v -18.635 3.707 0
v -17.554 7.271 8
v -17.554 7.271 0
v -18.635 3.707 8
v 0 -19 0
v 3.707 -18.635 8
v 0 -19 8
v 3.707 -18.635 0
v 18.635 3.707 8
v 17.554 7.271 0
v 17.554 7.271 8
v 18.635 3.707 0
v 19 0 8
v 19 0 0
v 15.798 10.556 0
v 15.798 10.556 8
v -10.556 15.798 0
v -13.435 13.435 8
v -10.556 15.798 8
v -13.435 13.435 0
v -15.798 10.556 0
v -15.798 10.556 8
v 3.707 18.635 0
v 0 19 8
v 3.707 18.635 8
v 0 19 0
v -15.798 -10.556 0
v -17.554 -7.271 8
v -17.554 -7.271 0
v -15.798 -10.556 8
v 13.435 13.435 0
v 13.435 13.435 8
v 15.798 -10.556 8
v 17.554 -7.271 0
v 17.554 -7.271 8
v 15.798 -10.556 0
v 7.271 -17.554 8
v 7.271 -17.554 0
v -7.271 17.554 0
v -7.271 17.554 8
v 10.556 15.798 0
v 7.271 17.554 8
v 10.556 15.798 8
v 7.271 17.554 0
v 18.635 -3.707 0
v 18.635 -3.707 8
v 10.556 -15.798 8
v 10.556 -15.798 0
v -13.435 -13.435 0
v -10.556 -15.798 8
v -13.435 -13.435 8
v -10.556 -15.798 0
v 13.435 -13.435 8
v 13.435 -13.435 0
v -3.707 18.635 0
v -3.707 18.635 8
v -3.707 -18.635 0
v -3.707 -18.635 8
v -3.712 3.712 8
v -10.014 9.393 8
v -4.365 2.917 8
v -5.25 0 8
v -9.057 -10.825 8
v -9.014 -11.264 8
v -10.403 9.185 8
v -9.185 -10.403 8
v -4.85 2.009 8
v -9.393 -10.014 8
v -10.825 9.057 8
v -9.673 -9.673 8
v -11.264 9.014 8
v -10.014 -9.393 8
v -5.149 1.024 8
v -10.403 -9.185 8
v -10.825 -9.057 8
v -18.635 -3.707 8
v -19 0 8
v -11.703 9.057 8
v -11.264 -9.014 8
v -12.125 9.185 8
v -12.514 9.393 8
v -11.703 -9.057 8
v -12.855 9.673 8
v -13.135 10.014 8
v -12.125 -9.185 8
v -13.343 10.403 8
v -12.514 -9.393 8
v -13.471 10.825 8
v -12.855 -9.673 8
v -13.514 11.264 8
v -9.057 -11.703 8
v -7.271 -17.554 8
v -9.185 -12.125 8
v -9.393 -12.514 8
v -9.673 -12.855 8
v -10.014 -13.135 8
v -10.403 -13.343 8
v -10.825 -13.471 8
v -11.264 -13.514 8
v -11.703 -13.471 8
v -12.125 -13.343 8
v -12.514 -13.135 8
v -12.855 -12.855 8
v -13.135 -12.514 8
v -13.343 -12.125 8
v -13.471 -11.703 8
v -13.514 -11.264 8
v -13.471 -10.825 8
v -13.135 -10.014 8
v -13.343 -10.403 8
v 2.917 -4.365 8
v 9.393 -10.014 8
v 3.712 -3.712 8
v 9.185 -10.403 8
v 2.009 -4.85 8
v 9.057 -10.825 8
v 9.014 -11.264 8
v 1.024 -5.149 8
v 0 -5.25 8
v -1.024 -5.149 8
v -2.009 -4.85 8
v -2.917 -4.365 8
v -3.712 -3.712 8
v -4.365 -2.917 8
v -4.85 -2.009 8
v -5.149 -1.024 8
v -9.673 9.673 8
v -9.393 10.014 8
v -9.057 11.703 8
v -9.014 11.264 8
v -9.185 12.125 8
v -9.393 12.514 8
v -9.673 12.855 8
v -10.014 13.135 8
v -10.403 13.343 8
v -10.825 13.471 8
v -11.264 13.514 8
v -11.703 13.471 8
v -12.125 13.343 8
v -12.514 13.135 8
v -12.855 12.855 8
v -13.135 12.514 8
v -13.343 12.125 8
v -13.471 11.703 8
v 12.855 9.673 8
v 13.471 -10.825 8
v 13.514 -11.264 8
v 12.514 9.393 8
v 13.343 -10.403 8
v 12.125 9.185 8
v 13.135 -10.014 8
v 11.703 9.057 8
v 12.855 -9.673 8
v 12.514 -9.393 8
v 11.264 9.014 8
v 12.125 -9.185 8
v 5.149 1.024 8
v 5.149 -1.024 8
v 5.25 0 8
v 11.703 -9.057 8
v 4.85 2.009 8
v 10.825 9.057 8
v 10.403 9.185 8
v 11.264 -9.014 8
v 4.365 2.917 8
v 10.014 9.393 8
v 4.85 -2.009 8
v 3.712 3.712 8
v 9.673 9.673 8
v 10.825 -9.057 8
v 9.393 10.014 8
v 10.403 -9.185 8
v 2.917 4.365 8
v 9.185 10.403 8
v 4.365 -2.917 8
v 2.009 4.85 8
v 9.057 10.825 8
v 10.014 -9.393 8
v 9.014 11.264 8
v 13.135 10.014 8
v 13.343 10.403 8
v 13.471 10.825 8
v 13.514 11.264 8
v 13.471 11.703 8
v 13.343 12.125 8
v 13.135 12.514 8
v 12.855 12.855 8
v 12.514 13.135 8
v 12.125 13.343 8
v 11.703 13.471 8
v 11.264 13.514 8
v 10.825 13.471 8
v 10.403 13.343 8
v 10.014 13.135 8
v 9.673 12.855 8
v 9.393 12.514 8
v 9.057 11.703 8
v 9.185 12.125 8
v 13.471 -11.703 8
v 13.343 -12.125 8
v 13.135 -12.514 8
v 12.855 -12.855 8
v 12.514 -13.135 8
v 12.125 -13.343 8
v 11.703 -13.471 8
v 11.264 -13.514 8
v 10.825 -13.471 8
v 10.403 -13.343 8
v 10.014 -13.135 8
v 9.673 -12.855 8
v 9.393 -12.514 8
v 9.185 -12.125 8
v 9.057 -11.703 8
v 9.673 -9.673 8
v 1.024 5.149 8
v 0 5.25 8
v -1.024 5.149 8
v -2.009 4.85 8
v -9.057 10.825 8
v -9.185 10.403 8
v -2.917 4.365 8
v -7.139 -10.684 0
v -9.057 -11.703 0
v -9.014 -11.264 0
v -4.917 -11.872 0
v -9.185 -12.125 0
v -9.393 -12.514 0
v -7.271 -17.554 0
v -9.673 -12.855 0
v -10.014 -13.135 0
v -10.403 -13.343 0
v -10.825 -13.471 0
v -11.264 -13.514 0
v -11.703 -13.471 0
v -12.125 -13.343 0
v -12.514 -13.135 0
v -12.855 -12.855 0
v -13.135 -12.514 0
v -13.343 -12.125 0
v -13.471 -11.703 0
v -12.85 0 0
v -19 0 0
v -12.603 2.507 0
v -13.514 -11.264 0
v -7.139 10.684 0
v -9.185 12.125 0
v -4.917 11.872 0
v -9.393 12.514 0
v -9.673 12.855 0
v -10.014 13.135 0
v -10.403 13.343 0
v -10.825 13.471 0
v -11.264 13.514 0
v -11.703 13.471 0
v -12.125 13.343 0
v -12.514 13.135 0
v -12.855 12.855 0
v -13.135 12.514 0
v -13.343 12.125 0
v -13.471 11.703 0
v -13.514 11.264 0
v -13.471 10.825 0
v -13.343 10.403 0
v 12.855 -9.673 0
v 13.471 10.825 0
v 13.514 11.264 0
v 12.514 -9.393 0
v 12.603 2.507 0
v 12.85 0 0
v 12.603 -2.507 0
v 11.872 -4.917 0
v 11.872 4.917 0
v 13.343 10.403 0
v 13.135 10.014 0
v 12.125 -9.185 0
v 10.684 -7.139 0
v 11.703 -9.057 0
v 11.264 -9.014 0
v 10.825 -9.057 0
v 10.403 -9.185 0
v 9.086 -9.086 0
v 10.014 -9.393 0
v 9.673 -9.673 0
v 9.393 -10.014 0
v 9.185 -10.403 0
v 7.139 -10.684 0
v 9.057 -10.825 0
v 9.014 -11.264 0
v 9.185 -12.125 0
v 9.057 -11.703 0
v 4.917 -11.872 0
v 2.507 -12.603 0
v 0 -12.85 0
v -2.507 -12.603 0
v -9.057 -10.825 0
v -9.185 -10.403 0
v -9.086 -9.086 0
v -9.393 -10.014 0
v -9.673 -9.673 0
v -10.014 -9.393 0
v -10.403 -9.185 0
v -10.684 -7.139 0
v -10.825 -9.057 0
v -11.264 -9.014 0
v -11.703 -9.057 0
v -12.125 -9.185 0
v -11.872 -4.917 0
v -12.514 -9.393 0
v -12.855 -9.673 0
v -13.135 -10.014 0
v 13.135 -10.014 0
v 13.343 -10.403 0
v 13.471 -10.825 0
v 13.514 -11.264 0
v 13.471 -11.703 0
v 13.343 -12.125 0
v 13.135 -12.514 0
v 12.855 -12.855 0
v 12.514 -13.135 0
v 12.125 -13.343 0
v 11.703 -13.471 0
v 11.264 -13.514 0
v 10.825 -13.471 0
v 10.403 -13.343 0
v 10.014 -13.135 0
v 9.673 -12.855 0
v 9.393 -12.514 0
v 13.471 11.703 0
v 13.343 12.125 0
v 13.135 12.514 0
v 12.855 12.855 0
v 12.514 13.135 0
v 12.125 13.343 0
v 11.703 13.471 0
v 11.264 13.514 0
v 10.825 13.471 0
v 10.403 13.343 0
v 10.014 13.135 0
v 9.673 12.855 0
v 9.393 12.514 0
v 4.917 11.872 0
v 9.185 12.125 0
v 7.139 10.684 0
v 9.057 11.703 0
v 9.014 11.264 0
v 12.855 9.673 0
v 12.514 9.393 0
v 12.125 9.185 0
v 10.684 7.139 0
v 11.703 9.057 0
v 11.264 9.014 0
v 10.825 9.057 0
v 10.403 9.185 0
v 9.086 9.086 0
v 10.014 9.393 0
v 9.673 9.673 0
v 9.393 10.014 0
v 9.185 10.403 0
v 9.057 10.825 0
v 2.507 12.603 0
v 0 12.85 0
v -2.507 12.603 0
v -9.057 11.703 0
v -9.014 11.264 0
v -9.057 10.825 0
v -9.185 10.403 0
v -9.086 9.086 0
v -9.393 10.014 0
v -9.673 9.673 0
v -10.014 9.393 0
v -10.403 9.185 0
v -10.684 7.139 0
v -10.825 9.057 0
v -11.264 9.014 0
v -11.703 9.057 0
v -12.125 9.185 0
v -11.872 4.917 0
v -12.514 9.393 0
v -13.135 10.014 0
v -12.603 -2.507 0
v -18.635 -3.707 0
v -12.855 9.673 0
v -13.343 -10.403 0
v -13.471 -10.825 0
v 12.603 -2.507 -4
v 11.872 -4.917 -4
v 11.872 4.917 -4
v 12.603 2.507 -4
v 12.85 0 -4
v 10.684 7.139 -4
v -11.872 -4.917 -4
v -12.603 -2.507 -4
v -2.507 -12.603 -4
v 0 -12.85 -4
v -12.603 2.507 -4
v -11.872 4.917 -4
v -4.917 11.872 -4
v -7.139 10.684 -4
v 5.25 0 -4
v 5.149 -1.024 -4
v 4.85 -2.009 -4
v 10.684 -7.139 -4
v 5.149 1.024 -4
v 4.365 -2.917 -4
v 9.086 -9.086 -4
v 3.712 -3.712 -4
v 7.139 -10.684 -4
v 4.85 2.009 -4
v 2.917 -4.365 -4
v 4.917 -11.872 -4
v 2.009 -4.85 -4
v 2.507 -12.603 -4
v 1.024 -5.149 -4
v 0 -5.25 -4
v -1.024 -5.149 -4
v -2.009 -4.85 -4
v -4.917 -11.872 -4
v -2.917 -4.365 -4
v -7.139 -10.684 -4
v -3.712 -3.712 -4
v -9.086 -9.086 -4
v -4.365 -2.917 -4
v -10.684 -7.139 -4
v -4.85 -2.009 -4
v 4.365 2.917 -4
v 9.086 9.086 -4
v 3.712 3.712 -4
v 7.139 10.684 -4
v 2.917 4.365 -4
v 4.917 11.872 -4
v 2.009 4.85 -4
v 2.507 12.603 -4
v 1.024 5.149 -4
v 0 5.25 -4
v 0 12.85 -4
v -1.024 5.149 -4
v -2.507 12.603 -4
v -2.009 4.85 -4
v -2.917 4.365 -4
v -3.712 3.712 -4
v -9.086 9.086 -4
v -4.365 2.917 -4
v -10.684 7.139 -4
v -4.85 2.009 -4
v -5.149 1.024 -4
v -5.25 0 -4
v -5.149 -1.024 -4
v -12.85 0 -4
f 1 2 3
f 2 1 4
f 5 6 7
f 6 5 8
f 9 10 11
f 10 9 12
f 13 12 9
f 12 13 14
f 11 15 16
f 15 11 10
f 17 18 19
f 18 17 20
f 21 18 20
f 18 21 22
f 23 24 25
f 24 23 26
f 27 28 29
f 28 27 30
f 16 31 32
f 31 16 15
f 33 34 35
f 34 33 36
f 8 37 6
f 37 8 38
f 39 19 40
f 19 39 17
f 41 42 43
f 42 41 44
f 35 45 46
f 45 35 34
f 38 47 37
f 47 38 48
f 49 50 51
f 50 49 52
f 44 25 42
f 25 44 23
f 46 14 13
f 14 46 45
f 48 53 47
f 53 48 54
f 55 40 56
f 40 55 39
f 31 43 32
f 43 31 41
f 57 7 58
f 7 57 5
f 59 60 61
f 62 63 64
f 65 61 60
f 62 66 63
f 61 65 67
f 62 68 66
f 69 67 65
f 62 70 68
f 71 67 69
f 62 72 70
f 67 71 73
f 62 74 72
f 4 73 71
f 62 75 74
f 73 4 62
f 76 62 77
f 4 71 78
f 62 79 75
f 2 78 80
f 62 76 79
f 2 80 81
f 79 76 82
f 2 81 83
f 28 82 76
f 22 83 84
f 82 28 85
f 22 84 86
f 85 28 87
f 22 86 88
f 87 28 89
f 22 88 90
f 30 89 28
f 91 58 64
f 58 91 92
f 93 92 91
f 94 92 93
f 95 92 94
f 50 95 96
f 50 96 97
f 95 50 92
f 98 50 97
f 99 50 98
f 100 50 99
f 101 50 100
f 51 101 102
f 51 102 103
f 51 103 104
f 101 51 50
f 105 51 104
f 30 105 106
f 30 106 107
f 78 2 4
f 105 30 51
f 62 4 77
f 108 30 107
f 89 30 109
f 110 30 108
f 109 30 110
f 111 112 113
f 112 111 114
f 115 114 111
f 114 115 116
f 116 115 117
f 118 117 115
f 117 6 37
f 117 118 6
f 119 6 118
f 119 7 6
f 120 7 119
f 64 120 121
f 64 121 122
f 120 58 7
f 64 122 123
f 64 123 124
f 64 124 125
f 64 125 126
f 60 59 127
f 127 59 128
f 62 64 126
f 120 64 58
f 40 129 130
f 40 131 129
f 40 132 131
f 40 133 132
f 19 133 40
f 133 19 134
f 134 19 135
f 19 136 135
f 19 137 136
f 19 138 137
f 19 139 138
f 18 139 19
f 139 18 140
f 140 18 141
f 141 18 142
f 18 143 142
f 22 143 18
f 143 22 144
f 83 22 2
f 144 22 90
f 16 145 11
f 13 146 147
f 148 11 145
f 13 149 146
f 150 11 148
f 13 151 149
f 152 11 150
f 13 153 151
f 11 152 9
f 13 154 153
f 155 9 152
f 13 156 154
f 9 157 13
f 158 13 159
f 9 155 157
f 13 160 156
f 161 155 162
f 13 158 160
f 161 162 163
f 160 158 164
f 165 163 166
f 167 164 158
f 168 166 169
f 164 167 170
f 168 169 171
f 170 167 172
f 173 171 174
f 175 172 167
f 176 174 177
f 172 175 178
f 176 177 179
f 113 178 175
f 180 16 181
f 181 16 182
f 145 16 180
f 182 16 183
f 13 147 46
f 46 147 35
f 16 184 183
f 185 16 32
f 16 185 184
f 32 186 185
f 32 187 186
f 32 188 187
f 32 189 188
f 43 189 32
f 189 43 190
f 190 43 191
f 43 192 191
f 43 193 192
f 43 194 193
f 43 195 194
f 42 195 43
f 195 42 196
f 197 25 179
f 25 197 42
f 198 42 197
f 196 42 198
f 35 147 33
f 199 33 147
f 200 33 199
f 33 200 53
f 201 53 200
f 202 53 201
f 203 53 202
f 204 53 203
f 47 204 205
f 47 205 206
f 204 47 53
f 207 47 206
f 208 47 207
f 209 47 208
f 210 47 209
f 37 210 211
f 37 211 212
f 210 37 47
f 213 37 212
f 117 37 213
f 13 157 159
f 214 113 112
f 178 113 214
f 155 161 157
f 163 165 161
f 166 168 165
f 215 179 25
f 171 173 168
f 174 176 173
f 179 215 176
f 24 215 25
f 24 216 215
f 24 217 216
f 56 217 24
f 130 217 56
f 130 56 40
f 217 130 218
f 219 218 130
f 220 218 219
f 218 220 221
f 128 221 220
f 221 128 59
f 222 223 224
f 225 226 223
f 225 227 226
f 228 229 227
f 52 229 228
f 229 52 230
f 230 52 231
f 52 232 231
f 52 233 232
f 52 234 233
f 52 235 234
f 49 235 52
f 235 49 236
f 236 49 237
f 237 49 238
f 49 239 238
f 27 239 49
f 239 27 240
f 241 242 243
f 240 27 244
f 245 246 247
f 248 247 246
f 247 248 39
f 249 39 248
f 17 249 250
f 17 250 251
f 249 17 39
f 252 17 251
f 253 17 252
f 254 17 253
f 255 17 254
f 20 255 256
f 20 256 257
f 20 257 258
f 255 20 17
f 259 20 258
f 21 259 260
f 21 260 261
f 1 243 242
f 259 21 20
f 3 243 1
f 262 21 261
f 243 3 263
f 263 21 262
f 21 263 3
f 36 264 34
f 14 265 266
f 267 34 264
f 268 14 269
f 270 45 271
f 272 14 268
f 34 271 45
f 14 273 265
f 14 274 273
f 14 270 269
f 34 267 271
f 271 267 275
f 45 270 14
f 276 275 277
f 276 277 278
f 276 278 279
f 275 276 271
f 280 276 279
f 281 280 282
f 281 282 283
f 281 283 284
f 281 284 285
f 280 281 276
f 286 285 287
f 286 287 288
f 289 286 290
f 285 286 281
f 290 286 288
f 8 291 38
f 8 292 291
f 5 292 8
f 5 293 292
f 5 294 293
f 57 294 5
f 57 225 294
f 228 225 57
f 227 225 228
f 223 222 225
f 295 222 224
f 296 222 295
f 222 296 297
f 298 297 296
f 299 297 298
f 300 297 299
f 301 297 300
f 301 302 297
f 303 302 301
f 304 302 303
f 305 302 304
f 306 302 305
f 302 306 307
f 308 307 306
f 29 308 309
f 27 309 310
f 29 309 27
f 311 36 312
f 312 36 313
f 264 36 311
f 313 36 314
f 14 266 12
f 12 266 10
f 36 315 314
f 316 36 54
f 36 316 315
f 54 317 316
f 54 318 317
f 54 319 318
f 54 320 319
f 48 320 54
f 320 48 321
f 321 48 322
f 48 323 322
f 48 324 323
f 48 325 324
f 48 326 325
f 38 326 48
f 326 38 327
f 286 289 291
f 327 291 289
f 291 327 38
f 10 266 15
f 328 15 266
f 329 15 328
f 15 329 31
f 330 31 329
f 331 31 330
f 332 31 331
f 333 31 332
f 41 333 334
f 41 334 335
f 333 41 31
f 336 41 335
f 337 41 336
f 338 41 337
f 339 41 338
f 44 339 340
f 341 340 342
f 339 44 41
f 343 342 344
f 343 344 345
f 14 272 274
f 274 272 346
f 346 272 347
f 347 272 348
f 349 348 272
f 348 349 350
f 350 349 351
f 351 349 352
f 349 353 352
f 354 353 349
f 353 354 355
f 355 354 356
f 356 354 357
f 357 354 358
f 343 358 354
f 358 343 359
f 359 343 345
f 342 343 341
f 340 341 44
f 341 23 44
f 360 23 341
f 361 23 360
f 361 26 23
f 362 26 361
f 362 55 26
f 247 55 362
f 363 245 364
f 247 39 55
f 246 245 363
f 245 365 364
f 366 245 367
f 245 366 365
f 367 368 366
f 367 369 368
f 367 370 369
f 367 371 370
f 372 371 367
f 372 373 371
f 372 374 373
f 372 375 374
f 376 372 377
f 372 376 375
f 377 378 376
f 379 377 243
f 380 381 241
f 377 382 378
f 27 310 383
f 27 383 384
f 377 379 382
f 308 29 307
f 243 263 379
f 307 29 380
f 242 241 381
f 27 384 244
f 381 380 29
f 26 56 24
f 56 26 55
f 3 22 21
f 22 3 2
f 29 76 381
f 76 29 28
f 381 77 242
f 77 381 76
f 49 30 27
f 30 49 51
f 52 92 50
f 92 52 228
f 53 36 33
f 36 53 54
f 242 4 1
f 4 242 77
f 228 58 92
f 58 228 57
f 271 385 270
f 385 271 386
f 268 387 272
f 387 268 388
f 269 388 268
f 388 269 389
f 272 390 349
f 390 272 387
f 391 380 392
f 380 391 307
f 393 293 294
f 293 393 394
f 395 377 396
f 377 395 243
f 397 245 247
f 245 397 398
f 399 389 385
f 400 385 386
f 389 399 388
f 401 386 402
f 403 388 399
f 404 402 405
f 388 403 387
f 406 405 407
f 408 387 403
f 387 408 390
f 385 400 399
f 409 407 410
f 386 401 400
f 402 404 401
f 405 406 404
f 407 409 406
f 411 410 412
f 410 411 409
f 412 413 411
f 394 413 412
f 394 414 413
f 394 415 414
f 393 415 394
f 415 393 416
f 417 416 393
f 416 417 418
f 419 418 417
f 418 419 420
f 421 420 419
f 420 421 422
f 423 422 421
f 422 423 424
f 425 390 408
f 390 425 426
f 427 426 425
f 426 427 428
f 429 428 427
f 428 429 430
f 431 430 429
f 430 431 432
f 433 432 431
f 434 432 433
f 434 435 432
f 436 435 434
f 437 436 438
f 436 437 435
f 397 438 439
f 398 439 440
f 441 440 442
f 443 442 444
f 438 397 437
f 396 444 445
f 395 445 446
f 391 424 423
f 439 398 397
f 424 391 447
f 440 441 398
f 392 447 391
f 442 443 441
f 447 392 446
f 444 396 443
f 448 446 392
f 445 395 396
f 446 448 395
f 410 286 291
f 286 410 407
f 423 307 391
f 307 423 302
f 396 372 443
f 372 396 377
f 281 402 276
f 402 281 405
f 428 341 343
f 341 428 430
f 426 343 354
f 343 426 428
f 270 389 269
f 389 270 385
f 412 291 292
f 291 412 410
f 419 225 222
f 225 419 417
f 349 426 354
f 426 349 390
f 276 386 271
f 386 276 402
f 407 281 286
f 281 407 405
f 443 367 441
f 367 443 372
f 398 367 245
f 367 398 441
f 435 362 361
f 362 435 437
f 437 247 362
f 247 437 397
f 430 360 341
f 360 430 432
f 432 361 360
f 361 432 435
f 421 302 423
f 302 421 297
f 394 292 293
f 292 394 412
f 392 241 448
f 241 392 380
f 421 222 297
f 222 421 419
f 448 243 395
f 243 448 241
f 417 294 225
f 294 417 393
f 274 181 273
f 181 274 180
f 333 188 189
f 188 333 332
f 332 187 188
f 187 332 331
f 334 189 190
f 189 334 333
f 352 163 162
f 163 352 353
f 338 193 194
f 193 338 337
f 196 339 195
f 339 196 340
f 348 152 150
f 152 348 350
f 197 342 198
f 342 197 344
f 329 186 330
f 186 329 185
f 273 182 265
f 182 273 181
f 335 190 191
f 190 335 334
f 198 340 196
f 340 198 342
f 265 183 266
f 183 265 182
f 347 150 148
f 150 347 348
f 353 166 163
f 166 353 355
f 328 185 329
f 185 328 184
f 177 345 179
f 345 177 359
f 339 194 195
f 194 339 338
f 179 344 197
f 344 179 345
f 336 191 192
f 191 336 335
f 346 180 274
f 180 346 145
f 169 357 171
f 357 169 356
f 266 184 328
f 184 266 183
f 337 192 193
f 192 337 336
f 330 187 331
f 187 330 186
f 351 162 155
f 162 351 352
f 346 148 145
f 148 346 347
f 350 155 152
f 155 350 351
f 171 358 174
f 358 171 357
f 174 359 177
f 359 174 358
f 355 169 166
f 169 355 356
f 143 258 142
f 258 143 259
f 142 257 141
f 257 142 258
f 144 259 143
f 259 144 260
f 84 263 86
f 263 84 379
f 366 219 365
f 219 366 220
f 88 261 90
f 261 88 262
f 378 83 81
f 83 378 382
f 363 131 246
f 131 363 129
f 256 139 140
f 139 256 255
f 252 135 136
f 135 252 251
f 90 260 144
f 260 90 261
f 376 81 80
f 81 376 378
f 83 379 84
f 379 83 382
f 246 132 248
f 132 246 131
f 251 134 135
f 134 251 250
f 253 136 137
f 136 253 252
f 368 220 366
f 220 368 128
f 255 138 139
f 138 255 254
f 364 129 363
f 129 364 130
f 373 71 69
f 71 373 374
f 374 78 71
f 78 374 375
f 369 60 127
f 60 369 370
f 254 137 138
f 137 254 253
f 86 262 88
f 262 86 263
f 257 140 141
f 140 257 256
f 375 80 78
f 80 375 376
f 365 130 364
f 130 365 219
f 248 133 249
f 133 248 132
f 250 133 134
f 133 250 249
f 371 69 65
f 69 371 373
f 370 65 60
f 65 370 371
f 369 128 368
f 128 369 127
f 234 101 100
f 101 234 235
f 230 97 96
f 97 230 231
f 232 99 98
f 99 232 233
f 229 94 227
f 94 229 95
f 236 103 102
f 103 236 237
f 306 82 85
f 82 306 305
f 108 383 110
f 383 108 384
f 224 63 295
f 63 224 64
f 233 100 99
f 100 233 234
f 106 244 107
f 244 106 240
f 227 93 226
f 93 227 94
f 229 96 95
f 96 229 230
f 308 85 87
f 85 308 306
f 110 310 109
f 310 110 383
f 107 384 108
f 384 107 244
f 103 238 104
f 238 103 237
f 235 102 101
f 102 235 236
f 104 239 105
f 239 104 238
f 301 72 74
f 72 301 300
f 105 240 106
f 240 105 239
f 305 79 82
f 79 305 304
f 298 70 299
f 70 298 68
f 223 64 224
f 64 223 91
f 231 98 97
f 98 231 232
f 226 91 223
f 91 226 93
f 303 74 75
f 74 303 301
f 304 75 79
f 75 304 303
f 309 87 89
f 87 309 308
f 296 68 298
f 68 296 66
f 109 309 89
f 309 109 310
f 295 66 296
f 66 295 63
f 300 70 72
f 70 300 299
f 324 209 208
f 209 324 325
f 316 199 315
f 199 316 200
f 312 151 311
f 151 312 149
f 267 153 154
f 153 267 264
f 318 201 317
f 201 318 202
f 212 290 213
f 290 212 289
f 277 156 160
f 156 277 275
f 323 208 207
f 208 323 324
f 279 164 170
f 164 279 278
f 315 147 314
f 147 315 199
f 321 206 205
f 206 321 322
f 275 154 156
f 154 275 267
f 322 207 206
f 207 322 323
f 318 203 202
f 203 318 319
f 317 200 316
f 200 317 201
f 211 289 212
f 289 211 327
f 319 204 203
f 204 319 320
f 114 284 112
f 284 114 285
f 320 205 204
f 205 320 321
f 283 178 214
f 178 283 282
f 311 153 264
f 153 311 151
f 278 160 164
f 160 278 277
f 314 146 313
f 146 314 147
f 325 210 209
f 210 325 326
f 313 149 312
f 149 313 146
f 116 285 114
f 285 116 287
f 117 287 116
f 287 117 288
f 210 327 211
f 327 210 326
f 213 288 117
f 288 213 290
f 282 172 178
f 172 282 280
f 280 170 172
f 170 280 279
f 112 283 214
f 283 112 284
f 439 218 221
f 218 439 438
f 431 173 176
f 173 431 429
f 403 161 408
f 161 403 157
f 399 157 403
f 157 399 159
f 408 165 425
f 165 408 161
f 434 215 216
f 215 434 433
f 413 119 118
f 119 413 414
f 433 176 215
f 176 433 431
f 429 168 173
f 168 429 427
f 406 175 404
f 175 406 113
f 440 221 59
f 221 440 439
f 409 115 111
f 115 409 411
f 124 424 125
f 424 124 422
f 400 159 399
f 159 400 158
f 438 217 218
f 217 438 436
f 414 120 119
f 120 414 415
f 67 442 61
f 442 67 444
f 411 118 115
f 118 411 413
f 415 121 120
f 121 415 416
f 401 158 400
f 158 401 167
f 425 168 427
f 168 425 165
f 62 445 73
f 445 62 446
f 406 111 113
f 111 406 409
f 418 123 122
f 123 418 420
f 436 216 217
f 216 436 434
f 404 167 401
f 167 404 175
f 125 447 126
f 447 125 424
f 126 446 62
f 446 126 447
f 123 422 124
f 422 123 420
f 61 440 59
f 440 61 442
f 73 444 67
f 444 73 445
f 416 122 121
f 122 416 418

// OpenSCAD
$fn = 32;

// ----------------------------------------------------------------------
// Retaining cap: 6000 cover, 38 mm, spigot 25.7 mm
// ----------------------------------------------------------------------

// --- parameters (mm) ---
plate_d = 38;             // cover diameter
plate_t = 8;              // cover thickness
boss_d = 25.7;            // spigot that enters the housing
boss_h = 4;               // spigot height
shaft_d = 10.5;           // shaft opening
bolt_d = 4.5;             // bolt clearance
bolt_r = 15.93;           // bolt circle radius

module cover() {
  cylinder(h = plate_t, d = plate_d);
}

module spigot() {
  /* sunk 1 mm into the cover; the spigot sets the overall height */
  translate([0, 0, -boss_h]) cylinder(h = boss_h + 1, d = boss_d);
}

difference() {
  union() {
    cover();
    spigot();
  }
  for (i = [0 : 3]) rotate([0, 0, 45 + i * 90]) translate([bolt_r, 0, -boss_h - 1])
    cylinder(h = boss_h + plate_t + 2, d = bolt_d);
  translate([0, 0, -boss_h - 1]) cylinder(h = boss_h + plate_t + 2, d = shaft_d);
}
